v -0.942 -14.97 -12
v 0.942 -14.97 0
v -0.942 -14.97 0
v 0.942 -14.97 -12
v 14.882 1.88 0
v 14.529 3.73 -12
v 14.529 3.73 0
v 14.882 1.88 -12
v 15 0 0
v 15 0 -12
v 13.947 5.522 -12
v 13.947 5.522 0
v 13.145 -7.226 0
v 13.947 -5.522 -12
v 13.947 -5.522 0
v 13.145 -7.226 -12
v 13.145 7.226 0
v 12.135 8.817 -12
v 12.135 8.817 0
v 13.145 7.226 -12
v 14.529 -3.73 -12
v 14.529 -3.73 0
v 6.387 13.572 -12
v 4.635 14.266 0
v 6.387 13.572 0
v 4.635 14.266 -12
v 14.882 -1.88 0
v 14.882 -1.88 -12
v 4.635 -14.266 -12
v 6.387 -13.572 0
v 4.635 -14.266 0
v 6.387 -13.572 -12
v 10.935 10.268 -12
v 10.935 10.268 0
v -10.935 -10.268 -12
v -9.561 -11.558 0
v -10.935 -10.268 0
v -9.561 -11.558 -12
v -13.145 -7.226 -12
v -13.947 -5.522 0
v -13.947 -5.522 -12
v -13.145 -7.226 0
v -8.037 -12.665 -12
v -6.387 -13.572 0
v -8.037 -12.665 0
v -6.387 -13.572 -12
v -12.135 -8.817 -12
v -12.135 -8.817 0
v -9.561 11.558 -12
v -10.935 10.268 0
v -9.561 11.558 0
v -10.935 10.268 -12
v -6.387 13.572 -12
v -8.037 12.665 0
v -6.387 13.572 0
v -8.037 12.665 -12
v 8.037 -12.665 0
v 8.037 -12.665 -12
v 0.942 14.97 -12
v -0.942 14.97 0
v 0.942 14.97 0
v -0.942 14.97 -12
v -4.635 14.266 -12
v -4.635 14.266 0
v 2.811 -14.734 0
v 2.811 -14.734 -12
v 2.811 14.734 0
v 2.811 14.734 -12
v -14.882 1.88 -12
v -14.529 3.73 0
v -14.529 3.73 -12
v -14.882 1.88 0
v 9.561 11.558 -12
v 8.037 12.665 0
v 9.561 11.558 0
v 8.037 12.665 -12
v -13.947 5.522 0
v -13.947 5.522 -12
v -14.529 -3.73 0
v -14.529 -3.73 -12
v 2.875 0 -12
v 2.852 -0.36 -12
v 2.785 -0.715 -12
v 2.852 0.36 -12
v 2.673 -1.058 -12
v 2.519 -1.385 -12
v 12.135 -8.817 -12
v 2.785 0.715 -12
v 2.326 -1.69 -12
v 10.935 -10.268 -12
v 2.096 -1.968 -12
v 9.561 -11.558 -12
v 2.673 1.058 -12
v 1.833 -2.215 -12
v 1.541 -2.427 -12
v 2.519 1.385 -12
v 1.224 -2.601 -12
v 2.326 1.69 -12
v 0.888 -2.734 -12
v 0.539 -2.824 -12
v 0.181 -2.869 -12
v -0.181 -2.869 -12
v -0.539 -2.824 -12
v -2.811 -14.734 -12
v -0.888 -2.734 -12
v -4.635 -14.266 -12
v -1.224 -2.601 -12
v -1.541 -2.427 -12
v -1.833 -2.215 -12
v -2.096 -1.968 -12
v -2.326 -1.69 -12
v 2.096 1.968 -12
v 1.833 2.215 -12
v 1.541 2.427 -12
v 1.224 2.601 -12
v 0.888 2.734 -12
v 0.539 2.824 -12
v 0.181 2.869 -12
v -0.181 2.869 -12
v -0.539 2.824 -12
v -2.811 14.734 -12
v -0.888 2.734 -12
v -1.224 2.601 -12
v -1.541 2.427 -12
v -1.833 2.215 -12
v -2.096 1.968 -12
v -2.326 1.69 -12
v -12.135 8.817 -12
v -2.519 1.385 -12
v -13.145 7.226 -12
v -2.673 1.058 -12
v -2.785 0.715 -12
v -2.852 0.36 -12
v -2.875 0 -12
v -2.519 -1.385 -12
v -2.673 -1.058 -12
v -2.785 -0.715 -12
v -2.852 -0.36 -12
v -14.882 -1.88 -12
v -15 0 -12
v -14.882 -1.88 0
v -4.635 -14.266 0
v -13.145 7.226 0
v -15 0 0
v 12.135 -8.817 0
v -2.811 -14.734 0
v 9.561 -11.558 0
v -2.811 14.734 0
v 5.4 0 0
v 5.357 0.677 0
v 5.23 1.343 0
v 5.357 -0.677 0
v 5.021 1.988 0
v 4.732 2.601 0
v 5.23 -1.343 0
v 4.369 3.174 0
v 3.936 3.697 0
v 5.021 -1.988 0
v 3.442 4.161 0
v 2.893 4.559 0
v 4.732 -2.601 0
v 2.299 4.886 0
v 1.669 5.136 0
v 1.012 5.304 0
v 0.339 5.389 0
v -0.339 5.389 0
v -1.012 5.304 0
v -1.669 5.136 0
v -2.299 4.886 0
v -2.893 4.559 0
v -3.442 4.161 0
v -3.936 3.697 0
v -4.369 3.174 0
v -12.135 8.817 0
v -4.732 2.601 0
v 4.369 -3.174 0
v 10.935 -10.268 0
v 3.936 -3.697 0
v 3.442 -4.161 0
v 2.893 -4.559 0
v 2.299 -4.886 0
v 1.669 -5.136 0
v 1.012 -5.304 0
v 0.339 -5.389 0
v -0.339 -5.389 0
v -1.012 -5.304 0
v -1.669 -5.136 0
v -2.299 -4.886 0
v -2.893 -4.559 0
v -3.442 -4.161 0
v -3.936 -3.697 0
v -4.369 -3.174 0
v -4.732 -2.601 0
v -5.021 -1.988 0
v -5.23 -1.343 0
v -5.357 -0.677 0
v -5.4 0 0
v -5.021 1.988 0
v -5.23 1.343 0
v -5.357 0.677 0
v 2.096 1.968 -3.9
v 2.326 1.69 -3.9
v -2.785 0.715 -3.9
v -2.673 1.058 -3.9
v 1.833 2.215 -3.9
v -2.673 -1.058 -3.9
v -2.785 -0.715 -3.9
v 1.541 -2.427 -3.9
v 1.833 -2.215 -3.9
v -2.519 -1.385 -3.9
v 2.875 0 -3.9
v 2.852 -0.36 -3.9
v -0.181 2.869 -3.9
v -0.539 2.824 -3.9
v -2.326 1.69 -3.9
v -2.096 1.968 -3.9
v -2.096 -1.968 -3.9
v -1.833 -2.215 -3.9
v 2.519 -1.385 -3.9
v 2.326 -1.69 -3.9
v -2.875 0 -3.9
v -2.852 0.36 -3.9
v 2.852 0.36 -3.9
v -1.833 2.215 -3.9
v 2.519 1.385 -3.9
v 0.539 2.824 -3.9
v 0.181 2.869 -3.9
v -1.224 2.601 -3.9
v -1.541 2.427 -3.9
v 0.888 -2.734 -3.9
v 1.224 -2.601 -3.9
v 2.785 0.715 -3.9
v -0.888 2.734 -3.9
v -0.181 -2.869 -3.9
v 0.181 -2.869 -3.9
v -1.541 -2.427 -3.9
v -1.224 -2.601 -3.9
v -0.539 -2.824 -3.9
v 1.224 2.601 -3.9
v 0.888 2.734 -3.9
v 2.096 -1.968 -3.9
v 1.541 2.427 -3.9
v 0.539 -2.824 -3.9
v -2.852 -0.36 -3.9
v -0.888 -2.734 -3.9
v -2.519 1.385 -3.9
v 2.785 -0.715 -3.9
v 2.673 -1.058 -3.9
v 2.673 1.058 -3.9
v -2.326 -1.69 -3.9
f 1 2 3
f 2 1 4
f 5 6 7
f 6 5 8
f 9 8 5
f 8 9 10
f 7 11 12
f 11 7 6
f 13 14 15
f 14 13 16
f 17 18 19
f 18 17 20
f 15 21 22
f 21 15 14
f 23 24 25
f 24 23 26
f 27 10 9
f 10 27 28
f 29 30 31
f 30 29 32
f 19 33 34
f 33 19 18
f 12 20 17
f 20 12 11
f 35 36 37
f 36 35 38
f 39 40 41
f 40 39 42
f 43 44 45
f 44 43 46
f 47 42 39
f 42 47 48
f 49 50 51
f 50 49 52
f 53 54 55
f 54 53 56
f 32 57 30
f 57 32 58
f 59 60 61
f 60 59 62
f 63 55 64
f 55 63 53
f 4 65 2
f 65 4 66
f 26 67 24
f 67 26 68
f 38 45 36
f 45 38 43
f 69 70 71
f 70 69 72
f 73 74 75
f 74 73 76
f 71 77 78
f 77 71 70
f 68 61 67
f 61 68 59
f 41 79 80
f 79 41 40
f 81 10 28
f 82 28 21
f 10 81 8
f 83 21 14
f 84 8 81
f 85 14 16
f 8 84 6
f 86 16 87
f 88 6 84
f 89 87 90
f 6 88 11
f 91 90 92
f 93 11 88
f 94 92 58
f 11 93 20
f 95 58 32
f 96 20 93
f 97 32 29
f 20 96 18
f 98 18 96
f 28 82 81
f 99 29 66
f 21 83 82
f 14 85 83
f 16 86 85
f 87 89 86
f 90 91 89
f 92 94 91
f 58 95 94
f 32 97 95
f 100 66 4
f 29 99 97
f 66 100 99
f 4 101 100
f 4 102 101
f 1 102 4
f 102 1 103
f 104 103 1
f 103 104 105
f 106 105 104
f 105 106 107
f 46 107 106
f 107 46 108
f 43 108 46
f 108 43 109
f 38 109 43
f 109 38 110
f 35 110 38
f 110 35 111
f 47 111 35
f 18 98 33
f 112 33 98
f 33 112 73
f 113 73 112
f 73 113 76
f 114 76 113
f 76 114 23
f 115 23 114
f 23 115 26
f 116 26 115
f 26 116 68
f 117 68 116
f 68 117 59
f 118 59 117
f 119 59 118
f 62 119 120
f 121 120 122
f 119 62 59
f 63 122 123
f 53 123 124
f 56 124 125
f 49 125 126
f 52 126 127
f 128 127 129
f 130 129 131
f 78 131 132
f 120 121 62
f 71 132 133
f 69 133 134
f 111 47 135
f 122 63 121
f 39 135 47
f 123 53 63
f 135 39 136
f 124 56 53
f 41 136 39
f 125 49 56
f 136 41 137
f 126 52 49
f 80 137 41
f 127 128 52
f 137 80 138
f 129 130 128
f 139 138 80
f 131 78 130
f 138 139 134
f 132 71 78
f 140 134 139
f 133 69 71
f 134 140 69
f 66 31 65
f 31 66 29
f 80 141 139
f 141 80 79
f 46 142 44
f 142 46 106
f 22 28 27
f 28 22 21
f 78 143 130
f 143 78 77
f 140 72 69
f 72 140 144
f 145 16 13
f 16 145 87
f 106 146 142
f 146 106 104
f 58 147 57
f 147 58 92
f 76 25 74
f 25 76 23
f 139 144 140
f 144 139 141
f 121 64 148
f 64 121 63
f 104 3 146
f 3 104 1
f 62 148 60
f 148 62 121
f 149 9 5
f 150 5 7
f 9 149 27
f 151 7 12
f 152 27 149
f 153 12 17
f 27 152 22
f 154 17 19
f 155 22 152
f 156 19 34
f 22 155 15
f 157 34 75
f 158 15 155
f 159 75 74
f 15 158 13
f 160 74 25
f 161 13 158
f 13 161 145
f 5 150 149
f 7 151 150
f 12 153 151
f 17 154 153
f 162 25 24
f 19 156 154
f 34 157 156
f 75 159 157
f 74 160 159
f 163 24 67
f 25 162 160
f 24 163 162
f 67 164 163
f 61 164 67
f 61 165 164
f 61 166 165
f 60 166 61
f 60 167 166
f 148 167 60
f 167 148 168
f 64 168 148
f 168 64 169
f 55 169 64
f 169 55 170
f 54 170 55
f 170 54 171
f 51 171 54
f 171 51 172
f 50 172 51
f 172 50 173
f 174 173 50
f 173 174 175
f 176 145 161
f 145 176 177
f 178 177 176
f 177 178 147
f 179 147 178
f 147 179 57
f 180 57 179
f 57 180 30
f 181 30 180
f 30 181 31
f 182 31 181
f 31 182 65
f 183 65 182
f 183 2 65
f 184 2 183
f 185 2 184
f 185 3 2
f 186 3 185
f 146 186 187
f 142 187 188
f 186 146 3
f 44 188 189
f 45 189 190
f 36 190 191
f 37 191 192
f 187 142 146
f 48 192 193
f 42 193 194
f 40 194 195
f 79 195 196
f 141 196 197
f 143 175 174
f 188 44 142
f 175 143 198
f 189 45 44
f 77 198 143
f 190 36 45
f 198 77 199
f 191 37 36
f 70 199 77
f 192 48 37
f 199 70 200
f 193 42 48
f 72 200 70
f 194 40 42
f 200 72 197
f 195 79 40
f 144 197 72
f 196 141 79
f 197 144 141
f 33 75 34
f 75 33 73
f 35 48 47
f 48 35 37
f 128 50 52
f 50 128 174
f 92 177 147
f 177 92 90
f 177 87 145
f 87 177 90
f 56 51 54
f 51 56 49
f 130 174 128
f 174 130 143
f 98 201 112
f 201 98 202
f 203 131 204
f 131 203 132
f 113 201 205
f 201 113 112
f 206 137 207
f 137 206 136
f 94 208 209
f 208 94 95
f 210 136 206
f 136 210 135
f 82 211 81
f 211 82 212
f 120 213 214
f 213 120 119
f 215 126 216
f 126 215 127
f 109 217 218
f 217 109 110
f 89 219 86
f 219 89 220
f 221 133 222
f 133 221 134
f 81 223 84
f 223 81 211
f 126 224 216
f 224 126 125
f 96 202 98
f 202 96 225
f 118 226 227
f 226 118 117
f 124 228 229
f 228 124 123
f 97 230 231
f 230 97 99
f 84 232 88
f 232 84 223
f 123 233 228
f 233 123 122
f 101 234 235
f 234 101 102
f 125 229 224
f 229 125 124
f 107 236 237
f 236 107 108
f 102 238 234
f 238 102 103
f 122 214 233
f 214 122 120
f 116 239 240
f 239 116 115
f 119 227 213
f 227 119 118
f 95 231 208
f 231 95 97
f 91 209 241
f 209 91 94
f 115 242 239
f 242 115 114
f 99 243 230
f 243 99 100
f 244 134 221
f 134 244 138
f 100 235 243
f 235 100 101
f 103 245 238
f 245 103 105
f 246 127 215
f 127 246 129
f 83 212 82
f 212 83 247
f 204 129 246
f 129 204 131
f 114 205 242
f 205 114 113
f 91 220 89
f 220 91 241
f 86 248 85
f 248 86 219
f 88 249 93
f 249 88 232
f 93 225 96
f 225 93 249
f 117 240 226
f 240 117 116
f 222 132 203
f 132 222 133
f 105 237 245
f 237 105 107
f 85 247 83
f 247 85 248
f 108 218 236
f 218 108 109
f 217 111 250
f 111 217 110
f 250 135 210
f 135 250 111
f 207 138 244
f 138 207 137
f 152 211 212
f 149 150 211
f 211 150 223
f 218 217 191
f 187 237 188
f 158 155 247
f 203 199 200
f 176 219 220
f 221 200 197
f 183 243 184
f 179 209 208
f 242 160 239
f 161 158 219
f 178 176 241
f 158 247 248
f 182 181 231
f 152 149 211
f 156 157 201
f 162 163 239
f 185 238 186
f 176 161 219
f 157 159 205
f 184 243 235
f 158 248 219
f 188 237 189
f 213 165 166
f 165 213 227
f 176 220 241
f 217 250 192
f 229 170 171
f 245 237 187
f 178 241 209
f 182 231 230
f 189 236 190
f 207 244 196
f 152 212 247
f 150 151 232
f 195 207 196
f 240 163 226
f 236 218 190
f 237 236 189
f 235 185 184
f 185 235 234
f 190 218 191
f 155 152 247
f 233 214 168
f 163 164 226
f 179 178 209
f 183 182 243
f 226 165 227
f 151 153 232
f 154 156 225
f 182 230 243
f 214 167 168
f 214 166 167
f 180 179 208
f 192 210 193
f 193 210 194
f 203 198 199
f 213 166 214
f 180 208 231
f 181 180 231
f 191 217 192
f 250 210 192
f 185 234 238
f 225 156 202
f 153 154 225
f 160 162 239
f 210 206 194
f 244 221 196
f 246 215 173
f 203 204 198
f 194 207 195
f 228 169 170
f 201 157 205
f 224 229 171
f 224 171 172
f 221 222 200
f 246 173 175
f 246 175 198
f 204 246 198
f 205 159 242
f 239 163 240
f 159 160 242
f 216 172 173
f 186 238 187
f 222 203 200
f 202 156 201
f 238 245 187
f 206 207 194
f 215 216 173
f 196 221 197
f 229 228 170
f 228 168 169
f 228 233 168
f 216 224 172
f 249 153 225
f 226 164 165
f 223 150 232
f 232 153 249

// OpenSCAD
$fn = 50;

difference() {
	union() {
		translate(v = [0, 0, -12.0]) {
			cylinder(h = 12, r = 15.0);
		}
		#translate(v = [0, 0, -15.0]) {
			cylinder(h = 15, r = 2.875);
		}
	}
	union() {
		translate(v = [0, 0, 0]) {
			rotate(a = [0, 0, 0]) {
				difference() {
					union() {
						translate(v = [0, 0, -15.0]) {
							cylinder(h = 15, r = 2.6);
						}
						translate(v = [0, 0, -3.9]) {
							cylinder(h = 3.9, r1 = 2.875, r2 = 5.4);
						}
						translate(v = [0, 0, -15.0]) {
							cylinder(h = 15, r = 2.875);
						}
						translate(v = [0, 0, -15.0]) {
							cylinder(h = 15, r = 2.6);
						}
					}
					union();
				}
			}
		}
	}
}
